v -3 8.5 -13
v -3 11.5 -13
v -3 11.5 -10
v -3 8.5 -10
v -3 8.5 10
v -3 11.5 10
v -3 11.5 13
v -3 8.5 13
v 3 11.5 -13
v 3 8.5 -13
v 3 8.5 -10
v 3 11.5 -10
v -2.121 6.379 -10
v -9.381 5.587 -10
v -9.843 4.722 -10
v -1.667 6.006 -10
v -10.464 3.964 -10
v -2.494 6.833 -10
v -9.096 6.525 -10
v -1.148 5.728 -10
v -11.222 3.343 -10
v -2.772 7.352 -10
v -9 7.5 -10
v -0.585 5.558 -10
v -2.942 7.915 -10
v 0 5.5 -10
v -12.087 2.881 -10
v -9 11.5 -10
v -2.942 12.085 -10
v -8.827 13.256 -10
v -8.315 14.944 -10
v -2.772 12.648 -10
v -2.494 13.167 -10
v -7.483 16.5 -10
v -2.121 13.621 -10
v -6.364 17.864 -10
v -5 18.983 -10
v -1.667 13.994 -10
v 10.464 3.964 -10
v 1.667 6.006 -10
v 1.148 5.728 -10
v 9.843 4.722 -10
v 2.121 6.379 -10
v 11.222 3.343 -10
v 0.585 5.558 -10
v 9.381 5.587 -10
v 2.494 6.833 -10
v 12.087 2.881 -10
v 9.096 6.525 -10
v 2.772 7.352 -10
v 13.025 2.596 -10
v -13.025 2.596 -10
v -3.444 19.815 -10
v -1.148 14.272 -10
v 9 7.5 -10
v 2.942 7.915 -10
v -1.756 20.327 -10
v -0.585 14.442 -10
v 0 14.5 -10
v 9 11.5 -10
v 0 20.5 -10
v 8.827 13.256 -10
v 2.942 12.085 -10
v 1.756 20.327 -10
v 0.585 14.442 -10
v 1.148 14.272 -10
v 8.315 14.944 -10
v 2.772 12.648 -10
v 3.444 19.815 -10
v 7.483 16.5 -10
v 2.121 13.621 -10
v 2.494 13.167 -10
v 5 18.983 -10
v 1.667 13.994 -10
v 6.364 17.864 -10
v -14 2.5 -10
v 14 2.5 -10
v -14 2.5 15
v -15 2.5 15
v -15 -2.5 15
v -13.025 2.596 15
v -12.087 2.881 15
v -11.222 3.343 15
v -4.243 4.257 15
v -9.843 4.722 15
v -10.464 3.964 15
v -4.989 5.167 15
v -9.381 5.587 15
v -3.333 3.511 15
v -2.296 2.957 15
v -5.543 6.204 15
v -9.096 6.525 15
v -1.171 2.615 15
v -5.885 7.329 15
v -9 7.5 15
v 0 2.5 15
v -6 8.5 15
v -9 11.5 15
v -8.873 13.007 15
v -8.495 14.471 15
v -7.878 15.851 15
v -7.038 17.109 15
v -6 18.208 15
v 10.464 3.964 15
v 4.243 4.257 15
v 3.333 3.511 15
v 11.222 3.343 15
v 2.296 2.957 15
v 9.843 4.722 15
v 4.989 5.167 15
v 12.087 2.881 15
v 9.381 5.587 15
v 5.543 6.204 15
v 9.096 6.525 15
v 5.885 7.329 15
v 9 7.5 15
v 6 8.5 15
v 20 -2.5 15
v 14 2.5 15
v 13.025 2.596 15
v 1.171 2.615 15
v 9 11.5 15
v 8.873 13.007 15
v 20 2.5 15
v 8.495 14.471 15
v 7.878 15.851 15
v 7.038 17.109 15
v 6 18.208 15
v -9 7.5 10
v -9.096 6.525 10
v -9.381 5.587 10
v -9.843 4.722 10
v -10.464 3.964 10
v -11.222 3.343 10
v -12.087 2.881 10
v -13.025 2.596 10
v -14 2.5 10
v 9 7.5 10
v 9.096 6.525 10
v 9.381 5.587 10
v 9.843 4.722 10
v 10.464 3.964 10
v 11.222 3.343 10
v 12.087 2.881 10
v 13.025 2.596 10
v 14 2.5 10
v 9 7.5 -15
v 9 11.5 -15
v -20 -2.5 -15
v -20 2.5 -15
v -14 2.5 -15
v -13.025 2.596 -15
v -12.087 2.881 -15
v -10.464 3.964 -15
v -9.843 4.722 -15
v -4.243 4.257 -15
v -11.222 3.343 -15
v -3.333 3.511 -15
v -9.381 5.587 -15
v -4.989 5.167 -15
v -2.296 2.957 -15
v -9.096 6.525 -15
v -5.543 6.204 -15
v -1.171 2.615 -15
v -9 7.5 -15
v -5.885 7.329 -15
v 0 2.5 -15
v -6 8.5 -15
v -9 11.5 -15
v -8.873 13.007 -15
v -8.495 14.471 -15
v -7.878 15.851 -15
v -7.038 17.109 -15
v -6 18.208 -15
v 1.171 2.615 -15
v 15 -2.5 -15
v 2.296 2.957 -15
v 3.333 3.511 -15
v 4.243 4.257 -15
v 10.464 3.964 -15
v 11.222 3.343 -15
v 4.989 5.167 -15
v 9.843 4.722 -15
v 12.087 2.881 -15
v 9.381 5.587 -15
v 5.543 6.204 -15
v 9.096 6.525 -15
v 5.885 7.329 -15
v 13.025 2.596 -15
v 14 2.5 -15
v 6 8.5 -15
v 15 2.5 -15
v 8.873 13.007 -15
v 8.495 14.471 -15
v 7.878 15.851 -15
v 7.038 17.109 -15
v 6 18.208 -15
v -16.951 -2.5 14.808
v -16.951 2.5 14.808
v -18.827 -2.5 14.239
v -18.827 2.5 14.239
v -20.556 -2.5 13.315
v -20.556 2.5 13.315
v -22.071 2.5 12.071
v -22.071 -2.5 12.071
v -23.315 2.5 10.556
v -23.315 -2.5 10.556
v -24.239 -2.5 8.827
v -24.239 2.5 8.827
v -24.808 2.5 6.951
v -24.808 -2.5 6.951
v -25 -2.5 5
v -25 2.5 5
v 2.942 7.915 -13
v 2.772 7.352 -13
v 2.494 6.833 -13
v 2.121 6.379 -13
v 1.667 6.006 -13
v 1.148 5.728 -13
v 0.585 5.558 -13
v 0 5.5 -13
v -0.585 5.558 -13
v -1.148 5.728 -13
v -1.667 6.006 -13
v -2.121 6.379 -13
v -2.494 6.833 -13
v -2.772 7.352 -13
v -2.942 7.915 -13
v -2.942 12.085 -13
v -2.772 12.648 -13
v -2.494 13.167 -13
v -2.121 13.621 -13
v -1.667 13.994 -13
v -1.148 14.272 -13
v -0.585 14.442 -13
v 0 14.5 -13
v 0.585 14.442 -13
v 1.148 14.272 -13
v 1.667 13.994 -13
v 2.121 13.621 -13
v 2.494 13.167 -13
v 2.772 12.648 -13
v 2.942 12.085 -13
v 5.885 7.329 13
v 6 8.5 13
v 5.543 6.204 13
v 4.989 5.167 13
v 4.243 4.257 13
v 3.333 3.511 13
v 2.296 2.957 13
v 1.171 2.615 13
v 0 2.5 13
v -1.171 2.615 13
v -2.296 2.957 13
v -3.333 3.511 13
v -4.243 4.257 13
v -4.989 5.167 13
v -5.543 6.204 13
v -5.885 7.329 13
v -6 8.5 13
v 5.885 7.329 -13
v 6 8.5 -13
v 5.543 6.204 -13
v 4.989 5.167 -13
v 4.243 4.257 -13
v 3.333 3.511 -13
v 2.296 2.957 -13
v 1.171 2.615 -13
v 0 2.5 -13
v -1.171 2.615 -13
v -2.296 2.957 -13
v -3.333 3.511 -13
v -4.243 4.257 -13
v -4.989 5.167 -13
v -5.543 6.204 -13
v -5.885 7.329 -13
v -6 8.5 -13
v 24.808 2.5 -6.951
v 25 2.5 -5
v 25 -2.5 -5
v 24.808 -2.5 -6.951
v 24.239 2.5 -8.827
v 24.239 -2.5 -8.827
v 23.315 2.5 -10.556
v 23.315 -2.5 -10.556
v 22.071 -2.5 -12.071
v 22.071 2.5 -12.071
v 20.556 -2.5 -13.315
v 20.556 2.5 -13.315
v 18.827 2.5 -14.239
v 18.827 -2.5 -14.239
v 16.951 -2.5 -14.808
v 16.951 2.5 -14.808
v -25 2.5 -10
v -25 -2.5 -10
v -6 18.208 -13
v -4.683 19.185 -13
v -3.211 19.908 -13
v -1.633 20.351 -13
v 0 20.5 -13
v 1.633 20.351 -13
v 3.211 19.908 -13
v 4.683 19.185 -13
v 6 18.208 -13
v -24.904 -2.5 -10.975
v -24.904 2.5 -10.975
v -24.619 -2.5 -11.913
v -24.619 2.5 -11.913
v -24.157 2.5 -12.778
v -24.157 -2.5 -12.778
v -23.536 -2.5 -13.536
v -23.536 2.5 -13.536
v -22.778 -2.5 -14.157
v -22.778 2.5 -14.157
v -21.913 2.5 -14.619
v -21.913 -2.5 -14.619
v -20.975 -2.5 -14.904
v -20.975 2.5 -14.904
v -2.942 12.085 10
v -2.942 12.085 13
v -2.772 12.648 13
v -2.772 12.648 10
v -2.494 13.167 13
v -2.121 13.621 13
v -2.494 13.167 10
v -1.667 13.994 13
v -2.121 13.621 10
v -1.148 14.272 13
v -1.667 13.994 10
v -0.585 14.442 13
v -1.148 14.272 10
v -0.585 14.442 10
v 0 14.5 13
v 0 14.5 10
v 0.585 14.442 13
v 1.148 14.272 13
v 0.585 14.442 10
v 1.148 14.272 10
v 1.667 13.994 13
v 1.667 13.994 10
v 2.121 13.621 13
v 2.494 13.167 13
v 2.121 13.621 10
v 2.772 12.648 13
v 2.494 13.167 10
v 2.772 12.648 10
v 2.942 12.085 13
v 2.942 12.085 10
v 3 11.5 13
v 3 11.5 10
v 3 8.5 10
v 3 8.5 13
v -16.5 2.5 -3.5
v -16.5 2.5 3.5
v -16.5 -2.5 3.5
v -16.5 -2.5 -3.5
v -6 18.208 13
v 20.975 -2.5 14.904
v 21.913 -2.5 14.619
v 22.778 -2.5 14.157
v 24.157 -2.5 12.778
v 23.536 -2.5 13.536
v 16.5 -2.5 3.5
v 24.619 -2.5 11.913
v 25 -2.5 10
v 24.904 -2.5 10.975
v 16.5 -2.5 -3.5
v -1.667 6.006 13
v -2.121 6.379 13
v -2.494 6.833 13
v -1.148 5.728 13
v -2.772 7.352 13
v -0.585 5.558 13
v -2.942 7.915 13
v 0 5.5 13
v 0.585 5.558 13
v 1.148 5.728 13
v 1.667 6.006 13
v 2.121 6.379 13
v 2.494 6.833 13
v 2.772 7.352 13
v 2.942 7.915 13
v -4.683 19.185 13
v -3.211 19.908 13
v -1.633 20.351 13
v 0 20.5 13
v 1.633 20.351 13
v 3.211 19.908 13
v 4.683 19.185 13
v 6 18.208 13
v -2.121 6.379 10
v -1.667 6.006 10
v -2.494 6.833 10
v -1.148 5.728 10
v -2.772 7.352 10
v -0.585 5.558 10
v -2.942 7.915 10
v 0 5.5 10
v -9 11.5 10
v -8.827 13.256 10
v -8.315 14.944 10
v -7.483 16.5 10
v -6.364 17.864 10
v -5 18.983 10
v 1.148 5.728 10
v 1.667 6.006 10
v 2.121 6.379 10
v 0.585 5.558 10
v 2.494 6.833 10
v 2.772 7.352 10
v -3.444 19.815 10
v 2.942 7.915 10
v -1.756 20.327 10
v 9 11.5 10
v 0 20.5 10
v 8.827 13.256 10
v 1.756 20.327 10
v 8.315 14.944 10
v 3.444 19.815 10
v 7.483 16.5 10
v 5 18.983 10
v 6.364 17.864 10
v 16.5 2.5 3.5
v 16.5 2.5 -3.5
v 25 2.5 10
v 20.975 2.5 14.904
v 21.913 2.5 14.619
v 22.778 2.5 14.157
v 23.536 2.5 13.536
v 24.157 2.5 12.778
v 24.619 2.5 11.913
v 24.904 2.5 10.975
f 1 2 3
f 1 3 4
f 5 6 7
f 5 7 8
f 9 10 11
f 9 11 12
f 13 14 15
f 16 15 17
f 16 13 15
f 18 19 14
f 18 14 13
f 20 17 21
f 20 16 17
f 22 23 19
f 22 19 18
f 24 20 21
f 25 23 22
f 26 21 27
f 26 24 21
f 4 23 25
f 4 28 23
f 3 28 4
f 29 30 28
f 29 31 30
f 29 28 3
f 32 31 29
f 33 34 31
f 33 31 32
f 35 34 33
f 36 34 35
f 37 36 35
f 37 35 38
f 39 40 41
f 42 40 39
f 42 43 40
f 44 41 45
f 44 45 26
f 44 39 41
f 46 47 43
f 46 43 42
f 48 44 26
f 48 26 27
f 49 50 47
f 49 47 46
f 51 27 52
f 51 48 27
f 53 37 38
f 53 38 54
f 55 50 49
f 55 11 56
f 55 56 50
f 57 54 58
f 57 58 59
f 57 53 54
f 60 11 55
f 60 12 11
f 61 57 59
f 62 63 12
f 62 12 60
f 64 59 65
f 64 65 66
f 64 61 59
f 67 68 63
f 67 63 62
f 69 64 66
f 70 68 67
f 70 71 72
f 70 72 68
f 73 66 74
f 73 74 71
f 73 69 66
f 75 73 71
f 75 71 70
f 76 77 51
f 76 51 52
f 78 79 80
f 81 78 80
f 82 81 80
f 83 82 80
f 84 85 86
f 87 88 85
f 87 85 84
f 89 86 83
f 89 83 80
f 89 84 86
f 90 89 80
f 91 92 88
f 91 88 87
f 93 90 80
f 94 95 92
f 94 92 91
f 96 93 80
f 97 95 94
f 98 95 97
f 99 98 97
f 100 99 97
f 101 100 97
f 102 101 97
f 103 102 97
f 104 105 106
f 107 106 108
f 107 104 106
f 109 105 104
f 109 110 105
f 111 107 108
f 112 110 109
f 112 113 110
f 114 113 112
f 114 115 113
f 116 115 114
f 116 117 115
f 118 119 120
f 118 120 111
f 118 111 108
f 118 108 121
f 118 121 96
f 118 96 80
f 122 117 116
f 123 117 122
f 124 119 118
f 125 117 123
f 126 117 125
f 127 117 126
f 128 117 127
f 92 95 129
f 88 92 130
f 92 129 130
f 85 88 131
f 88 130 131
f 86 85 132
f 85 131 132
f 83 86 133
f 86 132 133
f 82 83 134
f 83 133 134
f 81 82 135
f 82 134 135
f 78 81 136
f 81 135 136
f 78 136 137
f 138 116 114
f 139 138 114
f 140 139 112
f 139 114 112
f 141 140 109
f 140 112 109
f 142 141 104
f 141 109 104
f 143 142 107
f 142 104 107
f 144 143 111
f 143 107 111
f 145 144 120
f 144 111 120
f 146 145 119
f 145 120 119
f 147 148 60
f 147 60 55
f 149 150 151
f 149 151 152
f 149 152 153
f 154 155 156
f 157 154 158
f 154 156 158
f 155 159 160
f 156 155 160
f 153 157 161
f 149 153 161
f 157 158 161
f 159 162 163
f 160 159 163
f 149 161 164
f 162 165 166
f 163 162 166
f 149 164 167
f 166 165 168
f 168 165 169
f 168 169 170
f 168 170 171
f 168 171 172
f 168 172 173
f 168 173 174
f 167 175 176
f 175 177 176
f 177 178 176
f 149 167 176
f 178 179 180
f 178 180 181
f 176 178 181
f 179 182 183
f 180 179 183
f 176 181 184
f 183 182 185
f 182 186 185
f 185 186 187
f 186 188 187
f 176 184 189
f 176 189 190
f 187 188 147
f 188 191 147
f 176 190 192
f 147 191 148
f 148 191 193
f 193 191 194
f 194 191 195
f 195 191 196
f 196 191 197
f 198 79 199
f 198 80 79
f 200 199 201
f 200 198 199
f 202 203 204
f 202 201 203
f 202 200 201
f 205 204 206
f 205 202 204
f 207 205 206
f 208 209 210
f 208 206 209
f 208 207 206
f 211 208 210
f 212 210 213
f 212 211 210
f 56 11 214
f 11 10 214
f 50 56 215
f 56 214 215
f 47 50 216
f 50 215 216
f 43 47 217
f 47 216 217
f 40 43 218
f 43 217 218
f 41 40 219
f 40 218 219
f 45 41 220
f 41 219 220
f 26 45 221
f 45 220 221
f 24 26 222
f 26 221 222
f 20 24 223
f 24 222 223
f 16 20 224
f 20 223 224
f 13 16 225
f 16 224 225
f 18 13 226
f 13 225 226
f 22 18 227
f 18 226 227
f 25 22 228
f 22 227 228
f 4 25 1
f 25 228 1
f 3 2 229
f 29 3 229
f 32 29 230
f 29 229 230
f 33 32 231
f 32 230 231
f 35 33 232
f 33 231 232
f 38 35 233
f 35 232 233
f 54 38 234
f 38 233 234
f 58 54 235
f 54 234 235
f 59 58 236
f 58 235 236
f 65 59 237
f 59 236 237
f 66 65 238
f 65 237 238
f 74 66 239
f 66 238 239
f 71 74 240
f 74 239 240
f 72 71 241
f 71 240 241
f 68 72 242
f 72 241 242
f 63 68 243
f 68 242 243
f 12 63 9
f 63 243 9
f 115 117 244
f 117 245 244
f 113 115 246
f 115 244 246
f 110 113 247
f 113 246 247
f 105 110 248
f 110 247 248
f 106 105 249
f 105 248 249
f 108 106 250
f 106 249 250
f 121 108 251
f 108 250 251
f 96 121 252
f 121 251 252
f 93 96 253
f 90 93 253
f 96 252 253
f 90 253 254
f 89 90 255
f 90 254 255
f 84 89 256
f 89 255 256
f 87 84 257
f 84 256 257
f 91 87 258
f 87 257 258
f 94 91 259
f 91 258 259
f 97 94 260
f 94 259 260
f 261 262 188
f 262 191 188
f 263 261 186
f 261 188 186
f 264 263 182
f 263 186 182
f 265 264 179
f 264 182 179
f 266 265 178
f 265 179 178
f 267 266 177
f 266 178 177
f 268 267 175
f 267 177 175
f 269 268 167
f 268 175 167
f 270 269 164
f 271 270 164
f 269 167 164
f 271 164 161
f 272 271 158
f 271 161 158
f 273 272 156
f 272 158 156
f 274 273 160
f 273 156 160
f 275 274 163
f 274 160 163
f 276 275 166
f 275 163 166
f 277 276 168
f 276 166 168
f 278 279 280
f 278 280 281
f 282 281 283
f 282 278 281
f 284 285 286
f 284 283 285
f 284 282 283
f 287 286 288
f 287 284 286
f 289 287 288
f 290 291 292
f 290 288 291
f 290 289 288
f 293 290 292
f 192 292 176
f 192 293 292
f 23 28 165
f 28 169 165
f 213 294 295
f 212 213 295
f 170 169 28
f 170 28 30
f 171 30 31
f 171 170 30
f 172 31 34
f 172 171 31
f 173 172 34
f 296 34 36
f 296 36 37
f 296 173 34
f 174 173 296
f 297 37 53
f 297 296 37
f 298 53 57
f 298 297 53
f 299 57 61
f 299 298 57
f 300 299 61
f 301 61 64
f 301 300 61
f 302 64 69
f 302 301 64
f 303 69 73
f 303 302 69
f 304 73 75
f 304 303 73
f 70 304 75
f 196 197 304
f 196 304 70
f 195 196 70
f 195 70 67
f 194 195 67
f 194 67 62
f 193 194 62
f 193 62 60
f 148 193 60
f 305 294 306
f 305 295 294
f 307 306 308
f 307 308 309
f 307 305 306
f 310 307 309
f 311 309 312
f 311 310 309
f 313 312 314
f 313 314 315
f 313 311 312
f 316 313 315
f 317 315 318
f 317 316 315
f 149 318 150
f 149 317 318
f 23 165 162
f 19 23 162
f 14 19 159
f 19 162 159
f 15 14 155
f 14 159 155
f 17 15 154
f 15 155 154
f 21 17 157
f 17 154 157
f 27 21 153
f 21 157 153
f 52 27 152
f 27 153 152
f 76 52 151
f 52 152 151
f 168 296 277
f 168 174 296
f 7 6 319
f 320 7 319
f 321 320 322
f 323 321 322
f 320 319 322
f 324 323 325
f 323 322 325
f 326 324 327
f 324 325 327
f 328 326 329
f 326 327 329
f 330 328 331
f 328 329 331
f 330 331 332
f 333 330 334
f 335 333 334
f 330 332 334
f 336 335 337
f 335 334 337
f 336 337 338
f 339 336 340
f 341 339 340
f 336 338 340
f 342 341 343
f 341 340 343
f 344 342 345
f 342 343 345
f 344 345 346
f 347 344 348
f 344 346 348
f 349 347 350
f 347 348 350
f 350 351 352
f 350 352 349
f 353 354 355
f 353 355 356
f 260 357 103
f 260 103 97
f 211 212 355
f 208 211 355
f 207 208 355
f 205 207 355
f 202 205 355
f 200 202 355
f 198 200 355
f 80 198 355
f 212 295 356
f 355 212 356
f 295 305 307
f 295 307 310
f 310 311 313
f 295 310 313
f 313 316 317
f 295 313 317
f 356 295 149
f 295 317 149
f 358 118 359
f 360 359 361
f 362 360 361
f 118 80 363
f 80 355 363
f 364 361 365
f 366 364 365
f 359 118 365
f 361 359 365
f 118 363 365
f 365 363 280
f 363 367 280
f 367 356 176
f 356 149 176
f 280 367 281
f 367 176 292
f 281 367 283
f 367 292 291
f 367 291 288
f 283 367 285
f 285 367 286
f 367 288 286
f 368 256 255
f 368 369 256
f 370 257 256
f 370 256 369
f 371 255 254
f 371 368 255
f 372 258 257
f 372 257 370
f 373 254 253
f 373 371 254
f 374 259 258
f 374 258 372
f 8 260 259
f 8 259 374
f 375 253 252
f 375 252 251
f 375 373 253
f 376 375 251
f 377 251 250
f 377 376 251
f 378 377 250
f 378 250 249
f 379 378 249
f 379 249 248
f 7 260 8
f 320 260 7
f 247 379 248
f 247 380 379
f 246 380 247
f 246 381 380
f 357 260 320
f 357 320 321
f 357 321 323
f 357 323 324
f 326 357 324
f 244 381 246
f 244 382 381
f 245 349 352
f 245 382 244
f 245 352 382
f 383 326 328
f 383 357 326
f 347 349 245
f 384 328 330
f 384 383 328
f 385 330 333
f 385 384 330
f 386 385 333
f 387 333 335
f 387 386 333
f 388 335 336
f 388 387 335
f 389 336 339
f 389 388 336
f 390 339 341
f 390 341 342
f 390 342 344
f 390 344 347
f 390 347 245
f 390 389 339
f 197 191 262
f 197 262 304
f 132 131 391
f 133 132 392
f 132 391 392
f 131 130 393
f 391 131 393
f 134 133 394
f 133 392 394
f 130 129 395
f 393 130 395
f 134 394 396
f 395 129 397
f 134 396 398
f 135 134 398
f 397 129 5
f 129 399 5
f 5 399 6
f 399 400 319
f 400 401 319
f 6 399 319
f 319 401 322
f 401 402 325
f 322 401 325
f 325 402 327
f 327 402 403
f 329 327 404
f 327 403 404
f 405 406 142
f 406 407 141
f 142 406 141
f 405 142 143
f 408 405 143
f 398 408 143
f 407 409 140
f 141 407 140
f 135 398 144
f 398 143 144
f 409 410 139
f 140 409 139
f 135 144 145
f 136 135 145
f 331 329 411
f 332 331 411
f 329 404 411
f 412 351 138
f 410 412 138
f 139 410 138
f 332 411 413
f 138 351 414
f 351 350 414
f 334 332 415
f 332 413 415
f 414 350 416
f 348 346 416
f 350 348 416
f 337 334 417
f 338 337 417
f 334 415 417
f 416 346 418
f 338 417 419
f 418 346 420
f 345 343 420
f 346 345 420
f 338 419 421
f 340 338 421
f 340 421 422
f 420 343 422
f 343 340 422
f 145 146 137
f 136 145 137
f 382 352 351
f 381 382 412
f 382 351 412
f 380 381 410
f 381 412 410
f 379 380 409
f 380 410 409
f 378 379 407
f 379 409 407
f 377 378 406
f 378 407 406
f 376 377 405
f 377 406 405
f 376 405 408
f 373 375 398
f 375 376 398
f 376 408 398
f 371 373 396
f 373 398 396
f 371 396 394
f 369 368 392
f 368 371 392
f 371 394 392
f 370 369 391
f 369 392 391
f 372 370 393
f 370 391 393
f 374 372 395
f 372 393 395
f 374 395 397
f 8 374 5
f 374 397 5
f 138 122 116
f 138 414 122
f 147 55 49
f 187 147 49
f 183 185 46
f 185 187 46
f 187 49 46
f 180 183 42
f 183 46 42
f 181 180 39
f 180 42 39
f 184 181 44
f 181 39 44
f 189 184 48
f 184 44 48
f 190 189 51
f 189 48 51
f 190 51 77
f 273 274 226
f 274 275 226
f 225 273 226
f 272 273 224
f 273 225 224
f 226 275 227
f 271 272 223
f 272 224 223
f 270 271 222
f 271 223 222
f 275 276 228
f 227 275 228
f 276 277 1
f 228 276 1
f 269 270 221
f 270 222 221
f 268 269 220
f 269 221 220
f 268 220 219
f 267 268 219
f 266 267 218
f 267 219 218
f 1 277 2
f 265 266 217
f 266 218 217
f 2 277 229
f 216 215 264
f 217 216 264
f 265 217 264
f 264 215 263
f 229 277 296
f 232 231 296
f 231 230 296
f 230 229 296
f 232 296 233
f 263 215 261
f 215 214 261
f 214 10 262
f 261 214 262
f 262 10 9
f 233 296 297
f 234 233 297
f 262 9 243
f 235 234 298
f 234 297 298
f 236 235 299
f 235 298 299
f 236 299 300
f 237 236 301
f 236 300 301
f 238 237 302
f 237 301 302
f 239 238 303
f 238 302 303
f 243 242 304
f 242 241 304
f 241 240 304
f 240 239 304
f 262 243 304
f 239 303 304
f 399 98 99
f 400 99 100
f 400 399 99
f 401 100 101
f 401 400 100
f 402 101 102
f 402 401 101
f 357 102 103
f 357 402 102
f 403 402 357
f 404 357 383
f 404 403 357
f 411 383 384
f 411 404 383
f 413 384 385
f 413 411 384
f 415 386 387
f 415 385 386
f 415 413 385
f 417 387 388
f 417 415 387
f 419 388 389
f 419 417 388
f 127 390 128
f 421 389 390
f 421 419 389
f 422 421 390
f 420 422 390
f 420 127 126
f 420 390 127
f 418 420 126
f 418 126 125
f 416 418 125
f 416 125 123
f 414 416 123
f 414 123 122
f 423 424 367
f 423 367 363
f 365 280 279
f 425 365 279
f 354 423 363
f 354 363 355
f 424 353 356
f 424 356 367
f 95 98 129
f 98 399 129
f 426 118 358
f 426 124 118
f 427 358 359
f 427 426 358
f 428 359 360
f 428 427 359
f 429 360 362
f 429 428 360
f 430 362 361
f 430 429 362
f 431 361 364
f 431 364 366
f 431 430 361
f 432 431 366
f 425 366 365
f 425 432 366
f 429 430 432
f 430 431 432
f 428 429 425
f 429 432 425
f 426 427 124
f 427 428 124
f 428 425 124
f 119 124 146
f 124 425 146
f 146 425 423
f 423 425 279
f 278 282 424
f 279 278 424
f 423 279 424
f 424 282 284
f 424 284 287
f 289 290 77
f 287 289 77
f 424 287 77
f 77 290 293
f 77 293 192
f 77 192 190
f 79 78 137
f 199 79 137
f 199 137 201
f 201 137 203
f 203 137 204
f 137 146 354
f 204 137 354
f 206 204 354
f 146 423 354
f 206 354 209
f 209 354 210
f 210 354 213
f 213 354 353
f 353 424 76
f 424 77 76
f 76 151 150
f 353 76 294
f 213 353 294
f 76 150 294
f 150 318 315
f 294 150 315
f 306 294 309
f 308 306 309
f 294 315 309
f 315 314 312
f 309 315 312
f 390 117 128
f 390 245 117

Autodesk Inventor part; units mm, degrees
ref_plane "YZ Plane" through (0, 0, 0) normal (1, 0, 0) x (0, 1, 0)
ref_plane "XZ Plane" through (0, 0, 0) normal (0, 1, 0) x (-1, 0, 0)
ref_plane "XY Plane" through (0, 0, 0) normal (0, 0, 1) x (1, 0, 0)
sketch "스케치1" plane through (0, 0, 0) normal (0, 0, 1) x (1, 0, 0)
  line L0 (-25, 2.5) -> (-25, -2.5)
  line L1 (25, -2.5) -> (25, 2.5)
  line L2 (-25, -2.5) -> (25, -2.5)
  arc A0 (9, 11.5) -> (-9, 11.5) centre (0, 11.5) ccw
  line L3 (0, 11.5) -> (0, 8.5) construction
  line L4 (-3, 11.5) -> (-3, 8.5)
  line L5 (3, 8.5) -> (3, 11.5)
  arc A1 (3, 11.5) -> (-3, 11.5) centre (0, 11.5) ccw
  arc A2 (-3, 8.5) -> (3, 8.5) centre (0, 8.5) ccw
  line L6 (0, 20.1537) -> (0, 8.5) construction
  line L7 (-6, 18.2082) -> (-6, 8.5)
  line L8 (6, 8.5) -> (6, 18.2082)
  arc A3 (-6, 8.5) -> (6, 8.5) centre (0, 8.5) ccw
  line L9 (0, -7.1) -> (0, 25.1) projected
  line L10 (-9, 11.5) -> (-9, 2.5)
  line L11 (9, 11.5) -> (9, 2.5)
  line L12 (25, 2.5) -> (9, 2.5)
  line L13 (-9, 2.5) -> (-25, 2.5)
  point P0 (-25, 0)
  point P1 (0, 0)
  point P2 (0, 10)
  point P3 (0, 14.3269)
  dimension "d7" = 50
  dimension "d8" = 5
  dimension "d9" = 25
  dimension "d10" = 18
  dimension "d11" = 3
  dimension "d14" = 0
  dimension "d15" = 0
extrude "돌출1" add sketch "스케치1" along normal mid plane 30 contours L13 L10 A0 L7 A3 L9 L2 L0 | L9 A3 L8 A0 L11 L12 L1 L2
extrude "돌출2" add sketch "스케치1" along normal mid plane 26 contours L9 A2 L5 A1 A0 L8 A3 | A3 L7 A0 L9 A1 L4 A2
fillet "모깎기1" radius 5 2 edges at (9, 2.5, 0) (-9, 2.5, 0)
sketch "스케치3" plane through (0, 0, 0) normal (0, 0, 1) x (1, 0, 0)
  line L0 (-23.0758, 32.485) -> (23.2904, 32.485)
  line L1 (23.2904, 32.485) -> (23.2904, 2.5)
  line L2 (23.2904, 2.5) -> (-23.0758, 2.5)
  line L3 (-23.0758, 2.5) -> (-23.0758, 32.485)
  line L4 (-25, 2.5) -> (-14, 2.5) projected
  point P0 (0, 0)
  dimension "d21" = 0
extrude "돌출3" cut sketch "스케치3" along normal mid plane 20
sketch "스케치4" plane through (-25, 2.5, 15) normal (0, 1, 0) x (1, 0, 0)
  line L0 (8.5, 18.5) -> (41.5, 18.5)
  line L1 (41.5, 18.5) -> (41.5, 11.5)
  line L2 (41.5, 11.5) -> (8.5, 11.5)
  line L3 (8.5, 11.5) -> (8.5, 18.5)
  line L4 (8.5, 18.5) -> (41.5, 11.5) construction
  line L5 (41.5, 18.5) -> (8.5, 11.5) construction
  point P0 (25, 15)
  dimension "d24" = 33
  dimension "d25" = 7
extrude "돌출4" cut sketch "스케치4" against normal blind 20
fillet "모깎기2" radius 5 2 edges at (-25, 0, -15) (25, 0, 15)
fillet "모깎기3" radius 10 2 edges at (-25, 0, 15) (25, 0, -15)
properties part number "15-1"
